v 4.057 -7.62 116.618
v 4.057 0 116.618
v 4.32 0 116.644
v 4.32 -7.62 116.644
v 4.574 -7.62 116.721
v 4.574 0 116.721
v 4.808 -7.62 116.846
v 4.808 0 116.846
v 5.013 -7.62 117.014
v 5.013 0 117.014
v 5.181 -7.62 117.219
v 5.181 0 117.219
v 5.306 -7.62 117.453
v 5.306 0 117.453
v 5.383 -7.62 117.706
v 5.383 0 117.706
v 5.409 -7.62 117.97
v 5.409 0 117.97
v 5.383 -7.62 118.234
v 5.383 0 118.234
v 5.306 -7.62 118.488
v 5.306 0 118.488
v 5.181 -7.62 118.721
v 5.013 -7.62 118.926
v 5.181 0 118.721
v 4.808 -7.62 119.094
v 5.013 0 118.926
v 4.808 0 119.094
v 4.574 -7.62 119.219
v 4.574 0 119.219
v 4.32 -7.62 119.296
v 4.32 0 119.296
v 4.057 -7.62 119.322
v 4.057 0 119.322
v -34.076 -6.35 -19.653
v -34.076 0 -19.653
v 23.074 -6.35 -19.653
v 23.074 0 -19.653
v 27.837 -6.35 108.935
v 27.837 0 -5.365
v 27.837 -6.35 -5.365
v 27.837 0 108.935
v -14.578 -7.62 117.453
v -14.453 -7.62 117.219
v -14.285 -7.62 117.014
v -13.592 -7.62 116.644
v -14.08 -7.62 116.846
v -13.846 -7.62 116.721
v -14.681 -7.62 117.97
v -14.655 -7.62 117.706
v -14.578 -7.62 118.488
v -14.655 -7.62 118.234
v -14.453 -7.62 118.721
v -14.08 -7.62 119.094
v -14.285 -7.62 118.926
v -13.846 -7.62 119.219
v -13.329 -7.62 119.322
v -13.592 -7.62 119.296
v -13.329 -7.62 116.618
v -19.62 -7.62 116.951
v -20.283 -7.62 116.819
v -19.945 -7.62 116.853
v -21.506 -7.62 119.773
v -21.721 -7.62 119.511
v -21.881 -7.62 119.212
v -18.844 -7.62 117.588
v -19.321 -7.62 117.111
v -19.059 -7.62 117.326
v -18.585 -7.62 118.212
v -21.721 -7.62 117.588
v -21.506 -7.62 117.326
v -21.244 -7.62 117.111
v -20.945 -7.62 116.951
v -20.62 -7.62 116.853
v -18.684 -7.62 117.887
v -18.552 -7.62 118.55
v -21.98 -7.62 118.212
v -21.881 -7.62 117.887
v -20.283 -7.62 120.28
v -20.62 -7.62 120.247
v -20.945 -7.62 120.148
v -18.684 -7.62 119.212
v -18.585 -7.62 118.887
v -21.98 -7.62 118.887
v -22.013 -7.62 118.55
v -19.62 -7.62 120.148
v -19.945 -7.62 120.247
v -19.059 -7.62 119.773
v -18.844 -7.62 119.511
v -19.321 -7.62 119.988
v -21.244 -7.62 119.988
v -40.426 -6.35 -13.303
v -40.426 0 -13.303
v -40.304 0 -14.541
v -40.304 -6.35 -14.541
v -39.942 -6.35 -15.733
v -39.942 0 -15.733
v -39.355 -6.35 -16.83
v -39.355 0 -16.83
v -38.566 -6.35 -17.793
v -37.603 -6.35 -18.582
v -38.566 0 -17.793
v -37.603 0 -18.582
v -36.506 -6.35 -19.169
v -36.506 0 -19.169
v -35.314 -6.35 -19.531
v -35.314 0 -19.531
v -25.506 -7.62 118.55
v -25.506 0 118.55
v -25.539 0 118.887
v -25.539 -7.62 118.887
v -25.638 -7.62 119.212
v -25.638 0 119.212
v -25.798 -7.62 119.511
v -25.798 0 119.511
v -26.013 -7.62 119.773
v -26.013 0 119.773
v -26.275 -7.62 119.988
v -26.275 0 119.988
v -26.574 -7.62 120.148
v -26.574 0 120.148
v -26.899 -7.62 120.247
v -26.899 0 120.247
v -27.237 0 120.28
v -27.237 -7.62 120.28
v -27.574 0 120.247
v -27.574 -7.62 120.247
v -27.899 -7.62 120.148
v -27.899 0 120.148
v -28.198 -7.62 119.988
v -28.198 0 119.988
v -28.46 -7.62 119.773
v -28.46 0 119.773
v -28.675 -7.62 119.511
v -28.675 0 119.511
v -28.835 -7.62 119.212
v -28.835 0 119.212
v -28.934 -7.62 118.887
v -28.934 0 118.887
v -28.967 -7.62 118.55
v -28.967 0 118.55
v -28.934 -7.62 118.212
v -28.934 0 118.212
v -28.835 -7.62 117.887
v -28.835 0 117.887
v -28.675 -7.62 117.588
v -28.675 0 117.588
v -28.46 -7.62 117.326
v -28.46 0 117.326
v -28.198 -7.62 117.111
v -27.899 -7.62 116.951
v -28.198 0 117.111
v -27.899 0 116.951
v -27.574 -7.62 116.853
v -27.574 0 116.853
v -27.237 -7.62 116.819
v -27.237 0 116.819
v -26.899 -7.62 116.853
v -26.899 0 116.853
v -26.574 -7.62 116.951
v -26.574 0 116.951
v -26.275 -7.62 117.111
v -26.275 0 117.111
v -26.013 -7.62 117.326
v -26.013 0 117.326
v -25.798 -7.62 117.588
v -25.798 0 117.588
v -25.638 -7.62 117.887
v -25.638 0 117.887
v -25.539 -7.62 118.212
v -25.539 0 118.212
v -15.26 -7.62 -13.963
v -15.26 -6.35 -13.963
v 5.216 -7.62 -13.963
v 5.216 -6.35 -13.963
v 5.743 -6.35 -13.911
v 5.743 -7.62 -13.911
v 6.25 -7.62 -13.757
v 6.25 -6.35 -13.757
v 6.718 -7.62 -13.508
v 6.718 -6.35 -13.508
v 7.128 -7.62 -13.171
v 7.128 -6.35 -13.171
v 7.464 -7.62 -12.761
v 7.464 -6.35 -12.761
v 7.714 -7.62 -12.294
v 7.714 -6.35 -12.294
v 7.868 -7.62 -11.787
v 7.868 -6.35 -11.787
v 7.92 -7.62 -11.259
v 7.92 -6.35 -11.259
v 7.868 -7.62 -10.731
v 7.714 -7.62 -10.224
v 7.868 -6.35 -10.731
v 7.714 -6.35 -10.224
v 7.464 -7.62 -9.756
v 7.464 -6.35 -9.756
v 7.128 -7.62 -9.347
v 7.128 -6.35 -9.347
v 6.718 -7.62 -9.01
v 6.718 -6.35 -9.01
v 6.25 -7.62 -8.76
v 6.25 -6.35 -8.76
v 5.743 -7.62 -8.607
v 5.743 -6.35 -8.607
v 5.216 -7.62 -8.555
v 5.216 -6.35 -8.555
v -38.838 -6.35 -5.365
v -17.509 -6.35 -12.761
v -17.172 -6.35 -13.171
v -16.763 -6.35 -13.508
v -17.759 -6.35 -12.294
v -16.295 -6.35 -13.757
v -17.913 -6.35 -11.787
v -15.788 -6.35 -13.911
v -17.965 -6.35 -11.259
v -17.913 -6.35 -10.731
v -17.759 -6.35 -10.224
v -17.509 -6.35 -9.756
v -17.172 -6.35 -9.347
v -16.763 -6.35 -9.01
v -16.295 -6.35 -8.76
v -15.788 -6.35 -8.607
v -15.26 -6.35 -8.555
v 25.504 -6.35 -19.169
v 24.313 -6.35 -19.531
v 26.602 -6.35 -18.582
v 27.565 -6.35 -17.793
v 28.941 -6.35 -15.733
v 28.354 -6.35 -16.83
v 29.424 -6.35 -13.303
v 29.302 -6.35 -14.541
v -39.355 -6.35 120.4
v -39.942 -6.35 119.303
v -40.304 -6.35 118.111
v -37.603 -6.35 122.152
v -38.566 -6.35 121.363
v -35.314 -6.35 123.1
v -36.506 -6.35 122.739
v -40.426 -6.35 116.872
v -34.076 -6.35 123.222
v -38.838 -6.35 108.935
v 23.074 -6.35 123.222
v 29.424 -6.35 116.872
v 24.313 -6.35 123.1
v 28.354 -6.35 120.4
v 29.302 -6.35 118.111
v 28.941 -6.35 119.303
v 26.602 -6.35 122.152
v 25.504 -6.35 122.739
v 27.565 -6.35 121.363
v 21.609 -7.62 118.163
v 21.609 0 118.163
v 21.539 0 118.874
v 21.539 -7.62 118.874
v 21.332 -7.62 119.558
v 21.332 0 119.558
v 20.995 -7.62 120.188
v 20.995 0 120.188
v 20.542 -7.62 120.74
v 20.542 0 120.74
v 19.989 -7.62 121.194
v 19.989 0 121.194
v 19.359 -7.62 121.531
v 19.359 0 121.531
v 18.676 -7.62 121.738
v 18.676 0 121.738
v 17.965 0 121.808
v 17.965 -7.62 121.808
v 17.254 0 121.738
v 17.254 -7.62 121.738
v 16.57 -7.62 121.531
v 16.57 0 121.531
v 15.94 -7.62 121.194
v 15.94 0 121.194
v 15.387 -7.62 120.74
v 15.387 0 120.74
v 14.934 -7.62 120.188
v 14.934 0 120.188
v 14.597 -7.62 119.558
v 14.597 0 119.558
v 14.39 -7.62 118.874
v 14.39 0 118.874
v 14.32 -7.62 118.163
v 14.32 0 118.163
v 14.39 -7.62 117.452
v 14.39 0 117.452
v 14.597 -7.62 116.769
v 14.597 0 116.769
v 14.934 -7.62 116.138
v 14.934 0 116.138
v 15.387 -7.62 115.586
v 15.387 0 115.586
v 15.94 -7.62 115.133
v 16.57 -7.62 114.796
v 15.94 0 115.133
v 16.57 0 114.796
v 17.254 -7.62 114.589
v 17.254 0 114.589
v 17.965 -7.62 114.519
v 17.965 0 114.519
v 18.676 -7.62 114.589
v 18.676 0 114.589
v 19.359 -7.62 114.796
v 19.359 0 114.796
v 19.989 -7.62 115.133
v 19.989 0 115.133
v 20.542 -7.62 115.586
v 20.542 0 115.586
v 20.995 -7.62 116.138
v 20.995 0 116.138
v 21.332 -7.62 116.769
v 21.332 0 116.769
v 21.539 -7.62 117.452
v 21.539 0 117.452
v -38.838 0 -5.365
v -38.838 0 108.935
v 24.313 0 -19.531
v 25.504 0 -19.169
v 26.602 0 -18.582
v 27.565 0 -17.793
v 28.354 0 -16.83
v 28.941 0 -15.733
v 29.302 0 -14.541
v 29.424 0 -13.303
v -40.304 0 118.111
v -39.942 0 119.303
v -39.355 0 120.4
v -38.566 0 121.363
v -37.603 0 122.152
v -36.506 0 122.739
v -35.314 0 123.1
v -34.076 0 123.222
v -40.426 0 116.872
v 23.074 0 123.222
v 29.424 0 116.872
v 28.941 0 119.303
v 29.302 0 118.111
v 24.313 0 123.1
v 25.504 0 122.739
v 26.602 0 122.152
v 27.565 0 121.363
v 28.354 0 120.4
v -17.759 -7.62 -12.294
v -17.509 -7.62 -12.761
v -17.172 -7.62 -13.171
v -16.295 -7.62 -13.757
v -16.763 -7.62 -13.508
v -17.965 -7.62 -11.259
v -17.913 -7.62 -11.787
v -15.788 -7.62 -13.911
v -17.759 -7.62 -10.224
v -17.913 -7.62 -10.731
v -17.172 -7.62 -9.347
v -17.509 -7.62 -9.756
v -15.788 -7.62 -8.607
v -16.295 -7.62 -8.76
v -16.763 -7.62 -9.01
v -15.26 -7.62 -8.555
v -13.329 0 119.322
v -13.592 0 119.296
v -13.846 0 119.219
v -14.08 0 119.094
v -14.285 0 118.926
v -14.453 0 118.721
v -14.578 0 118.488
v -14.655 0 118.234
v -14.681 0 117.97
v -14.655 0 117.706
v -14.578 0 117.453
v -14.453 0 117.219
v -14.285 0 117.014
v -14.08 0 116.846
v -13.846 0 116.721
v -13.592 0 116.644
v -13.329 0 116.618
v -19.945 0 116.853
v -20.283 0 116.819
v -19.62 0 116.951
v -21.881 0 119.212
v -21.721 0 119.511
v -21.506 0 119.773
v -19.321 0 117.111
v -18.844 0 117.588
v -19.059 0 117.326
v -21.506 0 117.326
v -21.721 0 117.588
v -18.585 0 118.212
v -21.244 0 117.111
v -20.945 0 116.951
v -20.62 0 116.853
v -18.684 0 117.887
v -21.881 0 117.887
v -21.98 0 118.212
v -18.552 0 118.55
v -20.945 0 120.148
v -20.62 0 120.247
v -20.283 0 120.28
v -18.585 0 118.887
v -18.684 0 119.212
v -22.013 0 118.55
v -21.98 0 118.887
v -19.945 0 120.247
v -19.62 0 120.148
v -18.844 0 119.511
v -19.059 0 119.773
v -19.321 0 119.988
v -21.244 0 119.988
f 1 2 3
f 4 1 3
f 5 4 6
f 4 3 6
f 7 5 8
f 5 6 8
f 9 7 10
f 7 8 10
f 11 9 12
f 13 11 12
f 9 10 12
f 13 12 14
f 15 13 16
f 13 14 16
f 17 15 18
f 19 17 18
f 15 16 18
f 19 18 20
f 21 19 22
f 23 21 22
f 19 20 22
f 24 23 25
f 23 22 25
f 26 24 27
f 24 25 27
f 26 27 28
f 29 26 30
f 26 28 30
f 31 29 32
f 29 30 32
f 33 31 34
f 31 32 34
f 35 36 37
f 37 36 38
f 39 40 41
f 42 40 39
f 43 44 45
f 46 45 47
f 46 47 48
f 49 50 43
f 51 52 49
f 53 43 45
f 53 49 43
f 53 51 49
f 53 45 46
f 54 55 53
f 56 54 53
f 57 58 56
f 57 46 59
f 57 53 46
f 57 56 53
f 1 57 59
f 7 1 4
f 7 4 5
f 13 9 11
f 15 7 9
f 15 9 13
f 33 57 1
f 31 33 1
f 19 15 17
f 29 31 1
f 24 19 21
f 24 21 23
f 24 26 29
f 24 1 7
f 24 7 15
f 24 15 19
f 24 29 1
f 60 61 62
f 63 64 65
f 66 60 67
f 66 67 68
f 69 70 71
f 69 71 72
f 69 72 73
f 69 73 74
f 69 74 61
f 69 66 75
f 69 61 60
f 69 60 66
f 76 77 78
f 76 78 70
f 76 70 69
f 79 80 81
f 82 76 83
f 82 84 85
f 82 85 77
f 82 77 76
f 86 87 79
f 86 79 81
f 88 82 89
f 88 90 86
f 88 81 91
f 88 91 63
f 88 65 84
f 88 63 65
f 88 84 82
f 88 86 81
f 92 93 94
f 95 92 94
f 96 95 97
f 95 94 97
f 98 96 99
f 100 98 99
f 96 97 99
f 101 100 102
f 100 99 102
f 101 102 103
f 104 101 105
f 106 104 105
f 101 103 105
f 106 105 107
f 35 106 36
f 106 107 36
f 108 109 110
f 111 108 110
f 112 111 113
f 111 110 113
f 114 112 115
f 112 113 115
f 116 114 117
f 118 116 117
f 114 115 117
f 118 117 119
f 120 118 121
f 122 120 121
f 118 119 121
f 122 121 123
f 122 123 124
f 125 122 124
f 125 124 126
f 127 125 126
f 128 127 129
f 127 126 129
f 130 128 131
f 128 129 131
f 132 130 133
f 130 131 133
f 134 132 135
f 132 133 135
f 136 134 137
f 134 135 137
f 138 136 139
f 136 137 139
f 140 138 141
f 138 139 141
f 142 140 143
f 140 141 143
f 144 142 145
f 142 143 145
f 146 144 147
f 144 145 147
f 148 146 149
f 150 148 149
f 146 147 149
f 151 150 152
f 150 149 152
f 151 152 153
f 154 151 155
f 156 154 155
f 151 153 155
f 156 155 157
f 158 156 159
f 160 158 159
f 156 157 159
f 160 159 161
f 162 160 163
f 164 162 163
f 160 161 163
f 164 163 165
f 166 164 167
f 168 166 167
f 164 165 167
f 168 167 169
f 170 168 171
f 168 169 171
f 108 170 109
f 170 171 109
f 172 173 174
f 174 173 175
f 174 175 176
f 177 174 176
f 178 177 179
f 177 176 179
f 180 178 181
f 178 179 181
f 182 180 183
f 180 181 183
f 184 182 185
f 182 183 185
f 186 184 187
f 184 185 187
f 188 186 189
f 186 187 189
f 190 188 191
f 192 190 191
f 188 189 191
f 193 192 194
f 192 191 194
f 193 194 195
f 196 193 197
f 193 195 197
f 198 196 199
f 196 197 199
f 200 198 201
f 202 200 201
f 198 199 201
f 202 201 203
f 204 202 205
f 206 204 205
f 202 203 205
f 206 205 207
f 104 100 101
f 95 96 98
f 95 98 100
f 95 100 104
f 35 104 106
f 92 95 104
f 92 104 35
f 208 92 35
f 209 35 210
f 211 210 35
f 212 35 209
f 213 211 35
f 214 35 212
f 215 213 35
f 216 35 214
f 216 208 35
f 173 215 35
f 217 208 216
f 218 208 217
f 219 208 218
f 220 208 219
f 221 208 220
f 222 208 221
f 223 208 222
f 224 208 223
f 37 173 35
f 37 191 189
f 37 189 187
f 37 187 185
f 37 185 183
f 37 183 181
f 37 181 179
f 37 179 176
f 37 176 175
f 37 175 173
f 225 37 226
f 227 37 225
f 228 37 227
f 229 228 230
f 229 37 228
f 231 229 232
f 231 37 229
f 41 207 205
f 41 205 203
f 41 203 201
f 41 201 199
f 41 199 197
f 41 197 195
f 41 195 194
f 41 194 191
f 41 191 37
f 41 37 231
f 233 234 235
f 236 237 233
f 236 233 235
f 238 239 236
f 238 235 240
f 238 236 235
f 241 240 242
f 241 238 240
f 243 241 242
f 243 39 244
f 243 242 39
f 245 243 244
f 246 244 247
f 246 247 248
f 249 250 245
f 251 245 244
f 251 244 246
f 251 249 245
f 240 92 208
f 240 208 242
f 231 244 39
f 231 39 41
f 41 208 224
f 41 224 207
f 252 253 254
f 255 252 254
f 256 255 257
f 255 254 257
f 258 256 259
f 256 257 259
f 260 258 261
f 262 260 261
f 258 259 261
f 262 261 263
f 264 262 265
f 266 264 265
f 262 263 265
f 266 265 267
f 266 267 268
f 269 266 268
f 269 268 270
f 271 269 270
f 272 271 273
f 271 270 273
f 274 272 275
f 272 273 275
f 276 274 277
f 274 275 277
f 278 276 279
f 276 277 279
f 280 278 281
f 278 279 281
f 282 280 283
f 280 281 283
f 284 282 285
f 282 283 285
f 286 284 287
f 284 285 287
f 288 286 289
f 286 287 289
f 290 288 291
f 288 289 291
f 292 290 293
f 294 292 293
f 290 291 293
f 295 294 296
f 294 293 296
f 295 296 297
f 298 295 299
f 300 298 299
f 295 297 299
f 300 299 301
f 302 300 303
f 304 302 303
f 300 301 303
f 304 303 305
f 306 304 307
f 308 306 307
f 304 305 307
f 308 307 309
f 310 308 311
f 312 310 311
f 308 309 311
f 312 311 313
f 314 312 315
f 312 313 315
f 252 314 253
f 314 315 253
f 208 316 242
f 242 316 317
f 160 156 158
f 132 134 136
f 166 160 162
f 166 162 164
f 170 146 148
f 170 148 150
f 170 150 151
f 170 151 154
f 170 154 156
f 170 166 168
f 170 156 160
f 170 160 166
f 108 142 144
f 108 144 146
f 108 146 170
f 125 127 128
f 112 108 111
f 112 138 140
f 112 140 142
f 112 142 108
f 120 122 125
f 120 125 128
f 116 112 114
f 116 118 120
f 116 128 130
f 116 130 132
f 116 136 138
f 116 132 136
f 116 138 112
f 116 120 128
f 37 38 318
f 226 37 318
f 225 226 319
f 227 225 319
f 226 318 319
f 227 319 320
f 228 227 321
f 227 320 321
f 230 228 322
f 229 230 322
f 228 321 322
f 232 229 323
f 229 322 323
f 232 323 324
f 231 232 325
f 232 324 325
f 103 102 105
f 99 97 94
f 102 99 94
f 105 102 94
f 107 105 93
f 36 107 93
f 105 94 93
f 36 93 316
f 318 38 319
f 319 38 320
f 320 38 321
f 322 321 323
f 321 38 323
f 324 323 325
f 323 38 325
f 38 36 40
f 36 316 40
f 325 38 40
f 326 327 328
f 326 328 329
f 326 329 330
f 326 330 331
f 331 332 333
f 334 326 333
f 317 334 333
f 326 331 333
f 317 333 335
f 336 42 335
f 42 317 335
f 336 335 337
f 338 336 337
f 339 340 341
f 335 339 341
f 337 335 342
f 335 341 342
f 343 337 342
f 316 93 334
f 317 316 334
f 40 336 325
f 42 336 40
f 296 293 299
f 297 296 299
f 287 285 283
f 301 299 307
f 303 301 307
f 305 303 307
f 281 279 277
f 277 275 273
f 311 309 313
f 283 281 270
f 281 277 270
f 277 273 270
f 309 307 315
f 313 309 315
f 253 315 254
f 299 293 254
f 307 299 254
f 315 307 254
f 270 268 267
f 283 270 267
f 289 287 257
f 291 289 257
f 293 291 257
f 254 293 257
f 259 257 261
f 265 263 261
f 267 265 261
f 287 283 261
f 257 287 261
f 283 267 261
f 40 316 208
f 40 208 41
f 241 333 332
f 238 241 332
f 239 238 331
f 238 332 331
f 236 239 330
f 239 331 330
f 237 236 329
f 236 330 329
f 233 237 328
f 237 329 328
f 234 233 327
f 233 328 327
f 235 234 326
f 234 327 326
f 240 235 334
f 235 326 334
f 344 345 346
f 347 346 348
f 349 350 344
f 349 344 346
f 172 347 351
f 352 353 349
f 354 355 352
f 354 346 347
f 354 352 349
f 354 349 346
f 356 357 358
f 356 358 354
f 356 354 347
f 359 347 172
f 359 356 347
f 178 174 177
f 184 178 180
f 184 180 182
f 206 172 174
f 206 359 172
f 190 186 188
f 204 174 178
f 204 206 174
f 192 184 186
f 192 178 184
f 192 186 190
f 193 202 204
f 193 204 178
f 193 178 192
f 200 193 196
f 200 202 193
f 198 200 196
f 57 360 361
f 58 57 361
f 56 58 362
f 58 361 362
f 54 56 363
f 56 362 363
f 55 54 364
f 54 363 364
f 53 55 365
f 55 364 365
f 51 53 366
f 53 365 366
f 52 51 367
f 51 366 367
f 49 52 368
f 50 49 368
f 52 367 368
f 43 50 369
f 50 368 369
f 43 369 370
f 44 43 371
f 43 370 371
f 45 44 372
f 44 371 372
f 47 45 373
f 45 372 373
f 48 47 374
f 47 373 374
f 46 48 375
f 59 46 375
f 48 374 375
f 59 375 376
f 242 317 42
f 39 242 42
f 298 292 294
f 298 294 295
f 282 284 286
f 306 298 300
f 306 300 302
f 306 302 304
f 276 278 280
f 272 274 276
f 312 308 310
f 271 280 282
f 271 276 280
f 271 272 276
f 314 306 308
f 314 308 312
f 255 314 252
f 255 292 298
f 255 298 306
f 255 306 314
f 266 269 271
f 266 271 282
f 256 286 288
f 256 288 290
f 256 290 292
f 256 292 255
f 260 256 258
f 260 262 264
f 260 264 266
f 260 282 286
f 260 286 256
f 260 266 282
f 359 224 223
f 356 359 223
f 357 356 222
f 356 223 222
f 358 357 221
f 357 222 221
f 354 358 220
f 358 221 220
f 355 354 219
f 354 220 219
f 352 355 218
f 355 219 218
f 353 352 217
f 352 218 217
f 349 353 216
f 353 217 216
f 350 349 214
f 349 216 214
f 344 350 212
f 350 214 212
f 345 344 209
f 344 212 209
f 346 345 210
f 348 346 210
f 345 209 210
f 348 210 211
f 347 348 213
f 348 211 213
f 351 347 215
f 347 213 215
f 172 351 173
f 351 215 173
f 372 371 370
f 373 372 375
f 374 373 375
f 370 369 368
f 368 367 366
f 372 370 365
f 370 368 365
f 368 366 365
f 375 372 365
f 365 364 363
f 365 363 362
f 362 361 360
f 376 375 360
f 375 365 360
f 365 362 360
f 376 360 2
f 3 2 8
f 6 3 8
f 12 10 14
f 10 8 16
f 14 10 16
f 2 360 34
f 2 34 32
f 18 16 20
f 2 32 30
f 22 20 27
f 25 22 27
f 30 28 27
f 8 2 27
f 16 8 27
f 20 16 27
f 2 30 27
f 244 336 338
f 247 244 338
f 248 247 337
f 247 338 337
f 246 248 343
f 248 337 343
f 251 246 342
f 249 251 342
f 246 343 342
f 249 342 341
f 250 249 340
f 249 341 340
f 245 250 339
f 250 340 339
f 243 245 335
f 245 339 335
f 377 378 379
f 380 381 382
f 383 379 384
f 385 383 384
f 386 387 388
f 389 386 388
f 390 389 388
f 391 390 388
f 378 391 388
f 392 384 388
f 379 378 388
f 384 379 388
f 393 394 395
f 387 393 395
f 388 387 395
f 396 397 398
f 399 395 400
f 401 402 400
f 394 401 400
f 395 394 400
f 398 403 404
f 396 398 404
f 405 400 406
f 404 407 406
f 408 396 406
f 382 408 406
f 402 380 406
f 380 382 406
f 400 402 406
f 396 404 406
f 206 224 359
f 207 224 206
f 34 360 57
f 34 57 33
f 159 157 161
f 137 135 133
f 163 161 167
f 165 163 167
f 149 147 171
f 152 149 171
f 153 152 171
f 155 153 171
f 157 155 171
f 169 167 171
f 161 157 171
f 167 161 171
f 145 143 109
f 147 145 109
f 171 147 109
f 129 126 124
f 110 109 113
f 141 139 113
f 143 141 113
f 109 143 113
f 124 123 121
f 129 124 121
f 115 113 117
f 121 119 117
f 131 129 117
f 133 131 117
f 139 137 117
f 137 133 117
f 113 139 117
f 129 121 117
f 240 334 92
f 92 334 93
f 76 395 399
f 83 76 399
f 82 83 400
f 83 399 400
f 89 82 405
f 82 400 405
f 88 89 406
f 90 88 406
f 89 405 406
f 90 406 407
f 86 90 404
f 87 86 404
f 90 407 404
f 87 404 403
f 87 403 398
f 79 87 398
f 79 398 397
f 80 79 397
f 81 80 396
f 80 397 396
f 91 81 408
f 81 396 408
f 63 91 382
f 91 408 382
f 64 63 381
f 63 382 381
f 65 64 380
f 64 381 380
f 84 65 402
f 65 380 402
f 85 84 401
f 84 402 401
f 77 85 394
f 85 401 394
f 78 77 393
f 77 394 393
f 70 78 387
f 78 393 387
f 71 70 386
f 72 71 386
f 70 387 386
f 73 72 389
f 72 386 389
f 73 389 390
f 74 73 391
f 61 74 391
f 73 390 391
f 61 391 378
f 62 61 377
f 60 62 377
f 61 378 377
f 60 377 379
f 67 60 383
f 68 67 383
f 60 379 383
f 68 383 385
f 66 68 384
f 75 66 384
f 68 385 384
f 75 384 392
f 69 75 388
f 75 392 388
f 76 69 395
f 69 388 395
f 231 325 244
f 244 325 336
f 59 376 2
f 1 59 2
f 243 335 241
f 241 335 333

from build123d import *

# Parameters (mm, degrees)
F0_W     = 66.675
F0_H     = 114.3
F1_DEPTH = 6.35
F2_W     = 20.4757573083
F2_H     = 5.4086893797
F3_DEPTH = 7.62
F4_R     = 1.7303708669
F5_DEPTH = 7.62
F4_W     = 17.3850748688
F4_H     = 2.7043372393
F4_R_2   = 3.644682211


with BuildPart() as f1:
    # F0 (on Front) → F1 (new body)
    with BuildSketch(Plane.XZ):
        with BuildLine():
            Line((23.0744007826, 123.2224612594), (-34.0755992174, 123.2224612594))
            ThreePointArc((-34.0755992174, 123.2224612594), (-38.5657272779, 121.3625893199), (-40.4255992174, 116.8724612594))
            Line((-40.4255992174, 116.8724612594), (-40.4255992174, -13.3025387406))
            ThreePointArc((-40.4255992174, -13.3025387406), (-38.5657272779, -17.7926668012), (-34.0755992174, -19.6525387406))
            Line((-34.0755992174, -19.6525387406), (23.0744007826, -19.6525387406))
            ThreePointArc((23.0744007826, -19.6525387406), (27.5645288431, -17.7926668012), (29.4244007826, -13.3025387406))
            Line((29.4244007826, -13.3025387406), (29.4244007826, 116.8724612594))
            ThreePointArc((29.4244007826, 116.8724612594), (27.5645288431, 121.3625893199), (23.0744007826, 123.2224612594))
        make_face()
        with Locations((-5.5005992174, 51.7849612594)):
            Rectangle(F0_W, F0_H, mode=Mode.SUBTRACT)
    extrude(amount=F1_DEPTH)

    # F2 (on Front) → F3 (join)
    with BuildSketch(Plane.XZ):
        with Locations((-5.0223548897, -11.2589225173)):
            Rectangle(F2_W, F2_H)
        with BuildLine():
            Line((-15.2602335438, -13.9632672071), (-15.2602335438, -8.5545778275))
            ThreePointArc((-15.2602335438, -8.5545778275), (-17.9645782337, -11.2589225173), (-15.2602335438, -13.9632672071))
        make_face()
        with BuildLine():
            ThreePointArc((5.2155237645, -13.9632672071), (7.9198684543, -11.2589225173), (5.2155237645, -8.5545778275))
            Line((5.2155237645, -8.5545778275), (5.2155237645, -13.9632672071))
        make_face()
    extrude(amount=F3_DEPTH)


with BuildPart() as f5:
    # F4 (on Front) → F5 (new body)
    with BuildSketch(Plane.XZ):
        with Locations((-20.2825888991, 118.5496449471)):
            Circle(F4_R)
    extrude(amount=F5_DEPTH)


with BuildPart() as f5b:
    # F4 (on Front) → F5, piece 2 (new body)
    with BuildSketch(Plane.XZ):
        with Locations((-27.2366181016, 118.5496449471)):
            Circle(F4_R)
    extrude(amount=F5_DEPTH)


with BuildPart() as f5c:
    # F4 (on Front) → F5, piece 3 (new body)
    with BuildSketch(Plane.XZ):
        with Locations((-4.636021331, 117.9701462388)):
            Rectangle(F4_W, F4_H)
        with BuildLine():
            Line((-13.3285587654, 116.6179776192), (-13.3285587654, 119.3223148584))
            ThreePointArc((-13.3285587654, 119.3223148584), (-14.680727385, 117.9701462388), (-13.3285587654, 116.6179776192))
        make_face()
        with BuildLine():
            ThreePointArc((4.0565161034, 116.6179776192), (5.4086847231, 117.9701462388), (4.0565161034, 119.3223148584))
            Line((4.0565161034, 119.3223148584), (4.0565161034, 116.6179776192))
        make_face()
    extrude(amount=F5_DEPTH)


with BuildPart() as f5d:
    # F4 (on Front) → F5, piece 4 (new body)
    with BuildSketch(Plane.XZ):
        with Locations((17.9645773023, 118.1633174419)):
            Circle(F4_R_2)
    extrude(amount=F5_DEPTH)


solid = Compound([f1.part, f5.part, f5b.part, f5c.part, f5d.part])
